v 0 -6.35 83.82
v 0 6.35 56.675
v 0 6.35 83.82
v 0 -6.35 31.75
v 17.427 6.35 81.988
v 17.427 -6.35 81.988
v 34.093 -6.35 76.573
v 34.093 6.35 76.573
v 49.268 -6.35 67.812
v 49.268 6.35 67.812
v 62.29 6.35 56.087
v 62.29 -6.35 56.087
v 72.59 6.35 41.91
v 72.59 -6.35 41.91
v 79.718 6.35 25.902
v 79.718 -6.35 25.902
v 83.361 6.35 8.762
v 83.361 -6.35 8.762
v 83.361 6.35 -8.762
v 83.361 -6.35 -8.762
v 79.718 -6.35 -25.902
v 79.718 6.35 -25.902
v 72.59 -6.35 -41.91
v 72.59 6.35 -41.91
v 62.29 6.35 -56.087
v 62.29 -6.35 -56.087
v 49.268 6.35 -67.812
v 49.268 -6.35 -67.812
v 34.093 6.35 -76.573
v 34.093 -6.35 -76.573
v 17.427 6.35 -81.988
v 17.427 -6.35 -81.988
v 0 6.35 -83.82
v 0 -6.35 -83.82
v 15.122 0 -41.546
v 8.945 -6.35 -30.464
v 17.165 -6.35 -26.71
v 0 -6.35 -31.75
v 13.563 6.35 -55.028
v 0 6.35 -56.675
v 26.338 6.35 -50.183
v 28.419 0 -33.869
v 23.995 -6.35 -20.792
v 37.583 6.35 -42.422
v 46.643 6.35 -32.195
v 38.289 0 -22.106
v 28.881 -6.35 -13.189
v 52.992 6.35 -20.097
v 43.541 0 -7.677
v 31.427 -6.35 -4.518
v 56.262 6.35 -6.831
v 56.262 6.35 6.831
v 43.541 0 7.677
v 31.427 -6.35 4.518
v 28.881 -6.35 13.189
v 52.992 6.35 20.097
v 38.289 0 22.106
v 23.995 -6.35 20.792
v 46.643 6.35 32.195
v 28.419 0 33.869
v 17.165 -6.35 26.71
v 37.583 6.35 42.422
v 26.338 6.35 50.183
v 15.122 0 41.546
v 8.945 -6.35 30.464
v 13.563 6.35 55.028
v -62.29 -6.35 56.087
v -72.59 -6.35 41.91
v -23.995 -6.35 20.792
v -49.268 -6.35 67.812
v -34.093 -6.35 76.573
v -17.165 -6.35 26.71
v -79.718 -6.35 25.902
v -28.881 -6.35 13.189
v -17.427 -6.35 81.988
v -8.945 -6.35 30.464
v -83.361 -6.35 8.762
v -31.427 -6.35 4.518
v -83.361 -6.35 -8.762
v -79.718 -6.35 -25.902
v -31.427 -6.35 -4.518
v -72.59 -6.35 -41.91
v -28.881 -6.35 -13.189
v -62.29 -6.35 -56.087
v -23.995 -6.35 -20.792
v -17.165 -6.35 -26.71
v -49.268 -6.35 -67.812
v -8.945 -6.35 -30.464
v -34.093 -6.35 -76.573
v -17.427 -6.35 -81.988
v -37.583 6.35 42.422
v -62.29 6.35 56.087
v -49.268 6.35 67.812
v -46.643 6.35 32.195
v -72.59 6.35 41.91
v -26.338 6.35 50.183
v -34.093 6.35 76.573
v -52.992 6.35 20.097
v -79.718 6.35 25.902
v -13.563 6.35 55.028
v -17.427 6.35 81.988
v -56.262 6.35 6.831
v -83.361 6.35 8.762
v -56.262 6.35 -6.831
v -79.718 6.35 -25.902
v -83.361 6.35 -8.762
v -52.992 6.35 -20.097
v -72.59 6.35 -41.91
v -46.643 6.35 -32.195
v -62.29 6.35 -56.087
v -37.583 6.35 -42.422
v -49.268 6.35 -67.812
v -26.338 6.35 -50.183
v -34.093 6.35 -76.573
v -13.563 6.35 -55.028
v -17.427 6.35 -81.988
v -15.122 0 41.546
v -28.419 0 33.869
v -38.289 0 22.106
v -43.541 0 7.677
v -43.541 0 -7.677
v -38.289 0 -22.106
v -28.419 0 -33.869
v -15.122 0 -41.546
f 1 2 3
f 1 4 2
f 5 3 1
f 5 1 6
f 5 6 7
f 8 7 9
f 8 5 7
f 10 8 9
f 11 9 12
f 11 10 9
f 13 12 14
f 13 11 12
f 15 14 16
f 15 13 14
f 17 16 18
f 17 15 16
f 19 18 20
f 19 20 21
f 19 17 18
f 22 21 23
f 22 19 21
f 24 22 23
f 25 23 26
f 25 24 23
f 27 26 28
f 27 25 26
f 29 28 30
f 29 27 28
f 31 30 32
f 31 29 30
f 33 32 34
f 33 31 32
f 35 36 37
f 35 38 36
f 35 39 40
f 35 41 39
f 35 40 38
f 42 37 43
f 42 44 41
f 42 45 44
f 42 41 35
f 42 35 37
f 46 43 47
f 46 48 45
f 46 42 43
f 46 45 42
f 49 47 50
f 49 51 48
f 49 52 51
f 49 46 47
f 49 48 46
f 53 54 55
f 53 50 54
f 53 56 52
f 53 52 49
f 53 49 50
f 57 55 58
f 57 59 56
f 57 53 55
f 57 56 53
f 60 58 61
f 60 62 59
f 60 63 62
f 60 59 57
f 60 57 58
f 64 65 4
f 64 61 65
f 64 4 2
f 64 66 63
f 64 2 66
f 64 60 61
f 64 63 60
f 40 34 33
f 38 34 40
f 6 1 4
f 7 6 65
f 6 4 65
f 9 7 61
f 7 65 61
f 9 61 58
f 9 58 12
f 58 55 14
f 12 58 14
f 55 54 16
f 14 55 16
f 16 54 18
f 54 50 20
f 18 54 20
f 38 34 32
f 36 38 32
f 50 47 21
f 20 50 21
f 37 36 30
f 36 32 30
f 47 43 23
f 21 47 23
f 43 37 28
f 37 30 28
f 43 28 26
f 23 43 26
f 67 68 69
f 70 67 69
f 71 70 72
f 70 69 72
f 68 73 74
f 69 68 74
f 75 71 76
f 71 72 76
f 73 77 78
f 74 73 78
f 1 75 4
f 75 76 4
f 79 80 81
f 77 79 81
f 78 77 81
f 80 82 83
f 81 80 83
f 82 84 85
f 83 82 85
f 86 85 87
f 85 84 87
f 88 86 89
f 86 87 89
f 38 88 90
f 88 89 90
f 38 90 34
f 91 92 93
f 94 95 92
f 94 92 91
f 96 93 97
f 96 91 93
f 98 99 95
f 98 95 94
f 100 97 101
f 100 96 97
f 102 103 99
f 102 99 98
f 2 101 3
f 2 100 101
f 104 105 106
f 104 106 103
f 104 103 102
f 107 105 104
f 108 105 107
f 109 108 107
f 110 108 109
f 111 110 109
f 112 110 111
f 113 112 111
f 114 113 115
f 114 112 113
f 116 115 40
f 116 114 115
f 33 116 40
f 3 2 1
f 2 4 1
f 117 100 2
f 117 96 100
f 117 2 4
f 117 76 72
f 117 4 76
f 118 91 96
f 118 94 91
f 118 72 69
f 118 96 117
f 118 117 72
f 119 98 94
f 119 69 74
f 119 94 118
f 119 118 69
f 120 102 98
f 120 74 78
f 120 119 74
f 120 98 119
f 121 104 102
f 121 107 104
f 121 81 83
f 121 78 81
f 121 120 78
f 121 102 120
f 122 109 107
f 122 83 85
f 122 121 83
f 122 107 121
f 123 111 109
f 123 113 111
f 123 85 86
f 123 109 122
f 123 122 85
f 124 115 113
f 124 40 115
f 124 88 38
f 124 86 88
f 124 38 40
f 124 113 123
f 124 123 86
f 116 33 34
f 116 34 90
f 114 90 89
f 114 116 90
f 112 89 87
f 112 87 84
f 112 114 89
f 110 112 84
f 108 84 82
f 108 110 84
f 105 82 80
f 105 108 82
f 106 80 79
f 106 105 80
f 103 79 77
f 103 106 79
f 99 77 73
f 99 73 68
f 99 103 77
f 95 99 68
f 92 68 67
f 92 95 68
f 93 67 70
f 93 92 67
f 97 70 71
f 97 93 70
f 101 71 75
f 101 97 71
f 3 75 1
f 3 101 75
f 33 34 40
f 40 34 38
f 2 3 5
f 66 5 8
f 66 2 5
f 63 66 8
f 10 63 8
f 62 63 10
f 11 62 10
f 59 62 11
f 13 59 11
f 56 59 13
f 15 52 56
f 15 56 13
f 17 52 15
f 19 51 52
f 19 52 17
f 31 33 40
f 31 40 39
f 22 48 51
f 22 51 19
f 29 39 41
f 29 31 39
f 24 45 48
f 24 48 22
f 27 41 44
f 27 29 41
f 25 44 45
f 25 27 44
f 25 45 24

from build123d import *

# Parameters (mm, degrees)
SKETCH1_R           = 83.82
SKETCH1_R_2         = 31.75
BOSS_EXTRUDE1_DEPTH = 6.35


with BuildPart() as part:
    # Sketch1 → Boss-Extrude1 (new body, symmetric)
    with BuildSketch(Plane(origin=(0, 0, 0), x_dir=(1, 0, 0), z_dir=(0, 1, 0))):
        Circle(SKETCH1_R)
        Circle(SKETCH1_R_2, mode=Mode.SUBTRACT)
    extrude(amount=BOSS_EXTRUDE1_DEPTH, both=True)

    # Sketch3 → Cut-Revolve1 (revolve, cut)
    with BuildSketch(Plane.XY):
        Polygon((-31.75, -6.35), (-56.67515342, 6.35), (-31.75, 6.35), align=None)
    revolve(axis=Axis((0, 23.278593151, 0), (0, -1, 0)), mode=Mode.SUBTRACT)


with BuildPart() as body_2:
    # Split1: the piece on the far side of the plane
    add(part.part)
    split(bisect_by=Plane(origin=(0, 0, 0), x_dir=(0, 0, 1), z_dir=(1, 0, 0)), keep=Keep.BOTTOM)


with BuildPart() as part_1:
    add(part.part)

    # Split1
    split(bisect_by=Plane(origin=(0, 0, 0), x_dir=(0, 0, 1), z_dir=(1, 0, 0)), keep=Keep.TOP)


solid = Compound([body_2.part, part_1.part])
